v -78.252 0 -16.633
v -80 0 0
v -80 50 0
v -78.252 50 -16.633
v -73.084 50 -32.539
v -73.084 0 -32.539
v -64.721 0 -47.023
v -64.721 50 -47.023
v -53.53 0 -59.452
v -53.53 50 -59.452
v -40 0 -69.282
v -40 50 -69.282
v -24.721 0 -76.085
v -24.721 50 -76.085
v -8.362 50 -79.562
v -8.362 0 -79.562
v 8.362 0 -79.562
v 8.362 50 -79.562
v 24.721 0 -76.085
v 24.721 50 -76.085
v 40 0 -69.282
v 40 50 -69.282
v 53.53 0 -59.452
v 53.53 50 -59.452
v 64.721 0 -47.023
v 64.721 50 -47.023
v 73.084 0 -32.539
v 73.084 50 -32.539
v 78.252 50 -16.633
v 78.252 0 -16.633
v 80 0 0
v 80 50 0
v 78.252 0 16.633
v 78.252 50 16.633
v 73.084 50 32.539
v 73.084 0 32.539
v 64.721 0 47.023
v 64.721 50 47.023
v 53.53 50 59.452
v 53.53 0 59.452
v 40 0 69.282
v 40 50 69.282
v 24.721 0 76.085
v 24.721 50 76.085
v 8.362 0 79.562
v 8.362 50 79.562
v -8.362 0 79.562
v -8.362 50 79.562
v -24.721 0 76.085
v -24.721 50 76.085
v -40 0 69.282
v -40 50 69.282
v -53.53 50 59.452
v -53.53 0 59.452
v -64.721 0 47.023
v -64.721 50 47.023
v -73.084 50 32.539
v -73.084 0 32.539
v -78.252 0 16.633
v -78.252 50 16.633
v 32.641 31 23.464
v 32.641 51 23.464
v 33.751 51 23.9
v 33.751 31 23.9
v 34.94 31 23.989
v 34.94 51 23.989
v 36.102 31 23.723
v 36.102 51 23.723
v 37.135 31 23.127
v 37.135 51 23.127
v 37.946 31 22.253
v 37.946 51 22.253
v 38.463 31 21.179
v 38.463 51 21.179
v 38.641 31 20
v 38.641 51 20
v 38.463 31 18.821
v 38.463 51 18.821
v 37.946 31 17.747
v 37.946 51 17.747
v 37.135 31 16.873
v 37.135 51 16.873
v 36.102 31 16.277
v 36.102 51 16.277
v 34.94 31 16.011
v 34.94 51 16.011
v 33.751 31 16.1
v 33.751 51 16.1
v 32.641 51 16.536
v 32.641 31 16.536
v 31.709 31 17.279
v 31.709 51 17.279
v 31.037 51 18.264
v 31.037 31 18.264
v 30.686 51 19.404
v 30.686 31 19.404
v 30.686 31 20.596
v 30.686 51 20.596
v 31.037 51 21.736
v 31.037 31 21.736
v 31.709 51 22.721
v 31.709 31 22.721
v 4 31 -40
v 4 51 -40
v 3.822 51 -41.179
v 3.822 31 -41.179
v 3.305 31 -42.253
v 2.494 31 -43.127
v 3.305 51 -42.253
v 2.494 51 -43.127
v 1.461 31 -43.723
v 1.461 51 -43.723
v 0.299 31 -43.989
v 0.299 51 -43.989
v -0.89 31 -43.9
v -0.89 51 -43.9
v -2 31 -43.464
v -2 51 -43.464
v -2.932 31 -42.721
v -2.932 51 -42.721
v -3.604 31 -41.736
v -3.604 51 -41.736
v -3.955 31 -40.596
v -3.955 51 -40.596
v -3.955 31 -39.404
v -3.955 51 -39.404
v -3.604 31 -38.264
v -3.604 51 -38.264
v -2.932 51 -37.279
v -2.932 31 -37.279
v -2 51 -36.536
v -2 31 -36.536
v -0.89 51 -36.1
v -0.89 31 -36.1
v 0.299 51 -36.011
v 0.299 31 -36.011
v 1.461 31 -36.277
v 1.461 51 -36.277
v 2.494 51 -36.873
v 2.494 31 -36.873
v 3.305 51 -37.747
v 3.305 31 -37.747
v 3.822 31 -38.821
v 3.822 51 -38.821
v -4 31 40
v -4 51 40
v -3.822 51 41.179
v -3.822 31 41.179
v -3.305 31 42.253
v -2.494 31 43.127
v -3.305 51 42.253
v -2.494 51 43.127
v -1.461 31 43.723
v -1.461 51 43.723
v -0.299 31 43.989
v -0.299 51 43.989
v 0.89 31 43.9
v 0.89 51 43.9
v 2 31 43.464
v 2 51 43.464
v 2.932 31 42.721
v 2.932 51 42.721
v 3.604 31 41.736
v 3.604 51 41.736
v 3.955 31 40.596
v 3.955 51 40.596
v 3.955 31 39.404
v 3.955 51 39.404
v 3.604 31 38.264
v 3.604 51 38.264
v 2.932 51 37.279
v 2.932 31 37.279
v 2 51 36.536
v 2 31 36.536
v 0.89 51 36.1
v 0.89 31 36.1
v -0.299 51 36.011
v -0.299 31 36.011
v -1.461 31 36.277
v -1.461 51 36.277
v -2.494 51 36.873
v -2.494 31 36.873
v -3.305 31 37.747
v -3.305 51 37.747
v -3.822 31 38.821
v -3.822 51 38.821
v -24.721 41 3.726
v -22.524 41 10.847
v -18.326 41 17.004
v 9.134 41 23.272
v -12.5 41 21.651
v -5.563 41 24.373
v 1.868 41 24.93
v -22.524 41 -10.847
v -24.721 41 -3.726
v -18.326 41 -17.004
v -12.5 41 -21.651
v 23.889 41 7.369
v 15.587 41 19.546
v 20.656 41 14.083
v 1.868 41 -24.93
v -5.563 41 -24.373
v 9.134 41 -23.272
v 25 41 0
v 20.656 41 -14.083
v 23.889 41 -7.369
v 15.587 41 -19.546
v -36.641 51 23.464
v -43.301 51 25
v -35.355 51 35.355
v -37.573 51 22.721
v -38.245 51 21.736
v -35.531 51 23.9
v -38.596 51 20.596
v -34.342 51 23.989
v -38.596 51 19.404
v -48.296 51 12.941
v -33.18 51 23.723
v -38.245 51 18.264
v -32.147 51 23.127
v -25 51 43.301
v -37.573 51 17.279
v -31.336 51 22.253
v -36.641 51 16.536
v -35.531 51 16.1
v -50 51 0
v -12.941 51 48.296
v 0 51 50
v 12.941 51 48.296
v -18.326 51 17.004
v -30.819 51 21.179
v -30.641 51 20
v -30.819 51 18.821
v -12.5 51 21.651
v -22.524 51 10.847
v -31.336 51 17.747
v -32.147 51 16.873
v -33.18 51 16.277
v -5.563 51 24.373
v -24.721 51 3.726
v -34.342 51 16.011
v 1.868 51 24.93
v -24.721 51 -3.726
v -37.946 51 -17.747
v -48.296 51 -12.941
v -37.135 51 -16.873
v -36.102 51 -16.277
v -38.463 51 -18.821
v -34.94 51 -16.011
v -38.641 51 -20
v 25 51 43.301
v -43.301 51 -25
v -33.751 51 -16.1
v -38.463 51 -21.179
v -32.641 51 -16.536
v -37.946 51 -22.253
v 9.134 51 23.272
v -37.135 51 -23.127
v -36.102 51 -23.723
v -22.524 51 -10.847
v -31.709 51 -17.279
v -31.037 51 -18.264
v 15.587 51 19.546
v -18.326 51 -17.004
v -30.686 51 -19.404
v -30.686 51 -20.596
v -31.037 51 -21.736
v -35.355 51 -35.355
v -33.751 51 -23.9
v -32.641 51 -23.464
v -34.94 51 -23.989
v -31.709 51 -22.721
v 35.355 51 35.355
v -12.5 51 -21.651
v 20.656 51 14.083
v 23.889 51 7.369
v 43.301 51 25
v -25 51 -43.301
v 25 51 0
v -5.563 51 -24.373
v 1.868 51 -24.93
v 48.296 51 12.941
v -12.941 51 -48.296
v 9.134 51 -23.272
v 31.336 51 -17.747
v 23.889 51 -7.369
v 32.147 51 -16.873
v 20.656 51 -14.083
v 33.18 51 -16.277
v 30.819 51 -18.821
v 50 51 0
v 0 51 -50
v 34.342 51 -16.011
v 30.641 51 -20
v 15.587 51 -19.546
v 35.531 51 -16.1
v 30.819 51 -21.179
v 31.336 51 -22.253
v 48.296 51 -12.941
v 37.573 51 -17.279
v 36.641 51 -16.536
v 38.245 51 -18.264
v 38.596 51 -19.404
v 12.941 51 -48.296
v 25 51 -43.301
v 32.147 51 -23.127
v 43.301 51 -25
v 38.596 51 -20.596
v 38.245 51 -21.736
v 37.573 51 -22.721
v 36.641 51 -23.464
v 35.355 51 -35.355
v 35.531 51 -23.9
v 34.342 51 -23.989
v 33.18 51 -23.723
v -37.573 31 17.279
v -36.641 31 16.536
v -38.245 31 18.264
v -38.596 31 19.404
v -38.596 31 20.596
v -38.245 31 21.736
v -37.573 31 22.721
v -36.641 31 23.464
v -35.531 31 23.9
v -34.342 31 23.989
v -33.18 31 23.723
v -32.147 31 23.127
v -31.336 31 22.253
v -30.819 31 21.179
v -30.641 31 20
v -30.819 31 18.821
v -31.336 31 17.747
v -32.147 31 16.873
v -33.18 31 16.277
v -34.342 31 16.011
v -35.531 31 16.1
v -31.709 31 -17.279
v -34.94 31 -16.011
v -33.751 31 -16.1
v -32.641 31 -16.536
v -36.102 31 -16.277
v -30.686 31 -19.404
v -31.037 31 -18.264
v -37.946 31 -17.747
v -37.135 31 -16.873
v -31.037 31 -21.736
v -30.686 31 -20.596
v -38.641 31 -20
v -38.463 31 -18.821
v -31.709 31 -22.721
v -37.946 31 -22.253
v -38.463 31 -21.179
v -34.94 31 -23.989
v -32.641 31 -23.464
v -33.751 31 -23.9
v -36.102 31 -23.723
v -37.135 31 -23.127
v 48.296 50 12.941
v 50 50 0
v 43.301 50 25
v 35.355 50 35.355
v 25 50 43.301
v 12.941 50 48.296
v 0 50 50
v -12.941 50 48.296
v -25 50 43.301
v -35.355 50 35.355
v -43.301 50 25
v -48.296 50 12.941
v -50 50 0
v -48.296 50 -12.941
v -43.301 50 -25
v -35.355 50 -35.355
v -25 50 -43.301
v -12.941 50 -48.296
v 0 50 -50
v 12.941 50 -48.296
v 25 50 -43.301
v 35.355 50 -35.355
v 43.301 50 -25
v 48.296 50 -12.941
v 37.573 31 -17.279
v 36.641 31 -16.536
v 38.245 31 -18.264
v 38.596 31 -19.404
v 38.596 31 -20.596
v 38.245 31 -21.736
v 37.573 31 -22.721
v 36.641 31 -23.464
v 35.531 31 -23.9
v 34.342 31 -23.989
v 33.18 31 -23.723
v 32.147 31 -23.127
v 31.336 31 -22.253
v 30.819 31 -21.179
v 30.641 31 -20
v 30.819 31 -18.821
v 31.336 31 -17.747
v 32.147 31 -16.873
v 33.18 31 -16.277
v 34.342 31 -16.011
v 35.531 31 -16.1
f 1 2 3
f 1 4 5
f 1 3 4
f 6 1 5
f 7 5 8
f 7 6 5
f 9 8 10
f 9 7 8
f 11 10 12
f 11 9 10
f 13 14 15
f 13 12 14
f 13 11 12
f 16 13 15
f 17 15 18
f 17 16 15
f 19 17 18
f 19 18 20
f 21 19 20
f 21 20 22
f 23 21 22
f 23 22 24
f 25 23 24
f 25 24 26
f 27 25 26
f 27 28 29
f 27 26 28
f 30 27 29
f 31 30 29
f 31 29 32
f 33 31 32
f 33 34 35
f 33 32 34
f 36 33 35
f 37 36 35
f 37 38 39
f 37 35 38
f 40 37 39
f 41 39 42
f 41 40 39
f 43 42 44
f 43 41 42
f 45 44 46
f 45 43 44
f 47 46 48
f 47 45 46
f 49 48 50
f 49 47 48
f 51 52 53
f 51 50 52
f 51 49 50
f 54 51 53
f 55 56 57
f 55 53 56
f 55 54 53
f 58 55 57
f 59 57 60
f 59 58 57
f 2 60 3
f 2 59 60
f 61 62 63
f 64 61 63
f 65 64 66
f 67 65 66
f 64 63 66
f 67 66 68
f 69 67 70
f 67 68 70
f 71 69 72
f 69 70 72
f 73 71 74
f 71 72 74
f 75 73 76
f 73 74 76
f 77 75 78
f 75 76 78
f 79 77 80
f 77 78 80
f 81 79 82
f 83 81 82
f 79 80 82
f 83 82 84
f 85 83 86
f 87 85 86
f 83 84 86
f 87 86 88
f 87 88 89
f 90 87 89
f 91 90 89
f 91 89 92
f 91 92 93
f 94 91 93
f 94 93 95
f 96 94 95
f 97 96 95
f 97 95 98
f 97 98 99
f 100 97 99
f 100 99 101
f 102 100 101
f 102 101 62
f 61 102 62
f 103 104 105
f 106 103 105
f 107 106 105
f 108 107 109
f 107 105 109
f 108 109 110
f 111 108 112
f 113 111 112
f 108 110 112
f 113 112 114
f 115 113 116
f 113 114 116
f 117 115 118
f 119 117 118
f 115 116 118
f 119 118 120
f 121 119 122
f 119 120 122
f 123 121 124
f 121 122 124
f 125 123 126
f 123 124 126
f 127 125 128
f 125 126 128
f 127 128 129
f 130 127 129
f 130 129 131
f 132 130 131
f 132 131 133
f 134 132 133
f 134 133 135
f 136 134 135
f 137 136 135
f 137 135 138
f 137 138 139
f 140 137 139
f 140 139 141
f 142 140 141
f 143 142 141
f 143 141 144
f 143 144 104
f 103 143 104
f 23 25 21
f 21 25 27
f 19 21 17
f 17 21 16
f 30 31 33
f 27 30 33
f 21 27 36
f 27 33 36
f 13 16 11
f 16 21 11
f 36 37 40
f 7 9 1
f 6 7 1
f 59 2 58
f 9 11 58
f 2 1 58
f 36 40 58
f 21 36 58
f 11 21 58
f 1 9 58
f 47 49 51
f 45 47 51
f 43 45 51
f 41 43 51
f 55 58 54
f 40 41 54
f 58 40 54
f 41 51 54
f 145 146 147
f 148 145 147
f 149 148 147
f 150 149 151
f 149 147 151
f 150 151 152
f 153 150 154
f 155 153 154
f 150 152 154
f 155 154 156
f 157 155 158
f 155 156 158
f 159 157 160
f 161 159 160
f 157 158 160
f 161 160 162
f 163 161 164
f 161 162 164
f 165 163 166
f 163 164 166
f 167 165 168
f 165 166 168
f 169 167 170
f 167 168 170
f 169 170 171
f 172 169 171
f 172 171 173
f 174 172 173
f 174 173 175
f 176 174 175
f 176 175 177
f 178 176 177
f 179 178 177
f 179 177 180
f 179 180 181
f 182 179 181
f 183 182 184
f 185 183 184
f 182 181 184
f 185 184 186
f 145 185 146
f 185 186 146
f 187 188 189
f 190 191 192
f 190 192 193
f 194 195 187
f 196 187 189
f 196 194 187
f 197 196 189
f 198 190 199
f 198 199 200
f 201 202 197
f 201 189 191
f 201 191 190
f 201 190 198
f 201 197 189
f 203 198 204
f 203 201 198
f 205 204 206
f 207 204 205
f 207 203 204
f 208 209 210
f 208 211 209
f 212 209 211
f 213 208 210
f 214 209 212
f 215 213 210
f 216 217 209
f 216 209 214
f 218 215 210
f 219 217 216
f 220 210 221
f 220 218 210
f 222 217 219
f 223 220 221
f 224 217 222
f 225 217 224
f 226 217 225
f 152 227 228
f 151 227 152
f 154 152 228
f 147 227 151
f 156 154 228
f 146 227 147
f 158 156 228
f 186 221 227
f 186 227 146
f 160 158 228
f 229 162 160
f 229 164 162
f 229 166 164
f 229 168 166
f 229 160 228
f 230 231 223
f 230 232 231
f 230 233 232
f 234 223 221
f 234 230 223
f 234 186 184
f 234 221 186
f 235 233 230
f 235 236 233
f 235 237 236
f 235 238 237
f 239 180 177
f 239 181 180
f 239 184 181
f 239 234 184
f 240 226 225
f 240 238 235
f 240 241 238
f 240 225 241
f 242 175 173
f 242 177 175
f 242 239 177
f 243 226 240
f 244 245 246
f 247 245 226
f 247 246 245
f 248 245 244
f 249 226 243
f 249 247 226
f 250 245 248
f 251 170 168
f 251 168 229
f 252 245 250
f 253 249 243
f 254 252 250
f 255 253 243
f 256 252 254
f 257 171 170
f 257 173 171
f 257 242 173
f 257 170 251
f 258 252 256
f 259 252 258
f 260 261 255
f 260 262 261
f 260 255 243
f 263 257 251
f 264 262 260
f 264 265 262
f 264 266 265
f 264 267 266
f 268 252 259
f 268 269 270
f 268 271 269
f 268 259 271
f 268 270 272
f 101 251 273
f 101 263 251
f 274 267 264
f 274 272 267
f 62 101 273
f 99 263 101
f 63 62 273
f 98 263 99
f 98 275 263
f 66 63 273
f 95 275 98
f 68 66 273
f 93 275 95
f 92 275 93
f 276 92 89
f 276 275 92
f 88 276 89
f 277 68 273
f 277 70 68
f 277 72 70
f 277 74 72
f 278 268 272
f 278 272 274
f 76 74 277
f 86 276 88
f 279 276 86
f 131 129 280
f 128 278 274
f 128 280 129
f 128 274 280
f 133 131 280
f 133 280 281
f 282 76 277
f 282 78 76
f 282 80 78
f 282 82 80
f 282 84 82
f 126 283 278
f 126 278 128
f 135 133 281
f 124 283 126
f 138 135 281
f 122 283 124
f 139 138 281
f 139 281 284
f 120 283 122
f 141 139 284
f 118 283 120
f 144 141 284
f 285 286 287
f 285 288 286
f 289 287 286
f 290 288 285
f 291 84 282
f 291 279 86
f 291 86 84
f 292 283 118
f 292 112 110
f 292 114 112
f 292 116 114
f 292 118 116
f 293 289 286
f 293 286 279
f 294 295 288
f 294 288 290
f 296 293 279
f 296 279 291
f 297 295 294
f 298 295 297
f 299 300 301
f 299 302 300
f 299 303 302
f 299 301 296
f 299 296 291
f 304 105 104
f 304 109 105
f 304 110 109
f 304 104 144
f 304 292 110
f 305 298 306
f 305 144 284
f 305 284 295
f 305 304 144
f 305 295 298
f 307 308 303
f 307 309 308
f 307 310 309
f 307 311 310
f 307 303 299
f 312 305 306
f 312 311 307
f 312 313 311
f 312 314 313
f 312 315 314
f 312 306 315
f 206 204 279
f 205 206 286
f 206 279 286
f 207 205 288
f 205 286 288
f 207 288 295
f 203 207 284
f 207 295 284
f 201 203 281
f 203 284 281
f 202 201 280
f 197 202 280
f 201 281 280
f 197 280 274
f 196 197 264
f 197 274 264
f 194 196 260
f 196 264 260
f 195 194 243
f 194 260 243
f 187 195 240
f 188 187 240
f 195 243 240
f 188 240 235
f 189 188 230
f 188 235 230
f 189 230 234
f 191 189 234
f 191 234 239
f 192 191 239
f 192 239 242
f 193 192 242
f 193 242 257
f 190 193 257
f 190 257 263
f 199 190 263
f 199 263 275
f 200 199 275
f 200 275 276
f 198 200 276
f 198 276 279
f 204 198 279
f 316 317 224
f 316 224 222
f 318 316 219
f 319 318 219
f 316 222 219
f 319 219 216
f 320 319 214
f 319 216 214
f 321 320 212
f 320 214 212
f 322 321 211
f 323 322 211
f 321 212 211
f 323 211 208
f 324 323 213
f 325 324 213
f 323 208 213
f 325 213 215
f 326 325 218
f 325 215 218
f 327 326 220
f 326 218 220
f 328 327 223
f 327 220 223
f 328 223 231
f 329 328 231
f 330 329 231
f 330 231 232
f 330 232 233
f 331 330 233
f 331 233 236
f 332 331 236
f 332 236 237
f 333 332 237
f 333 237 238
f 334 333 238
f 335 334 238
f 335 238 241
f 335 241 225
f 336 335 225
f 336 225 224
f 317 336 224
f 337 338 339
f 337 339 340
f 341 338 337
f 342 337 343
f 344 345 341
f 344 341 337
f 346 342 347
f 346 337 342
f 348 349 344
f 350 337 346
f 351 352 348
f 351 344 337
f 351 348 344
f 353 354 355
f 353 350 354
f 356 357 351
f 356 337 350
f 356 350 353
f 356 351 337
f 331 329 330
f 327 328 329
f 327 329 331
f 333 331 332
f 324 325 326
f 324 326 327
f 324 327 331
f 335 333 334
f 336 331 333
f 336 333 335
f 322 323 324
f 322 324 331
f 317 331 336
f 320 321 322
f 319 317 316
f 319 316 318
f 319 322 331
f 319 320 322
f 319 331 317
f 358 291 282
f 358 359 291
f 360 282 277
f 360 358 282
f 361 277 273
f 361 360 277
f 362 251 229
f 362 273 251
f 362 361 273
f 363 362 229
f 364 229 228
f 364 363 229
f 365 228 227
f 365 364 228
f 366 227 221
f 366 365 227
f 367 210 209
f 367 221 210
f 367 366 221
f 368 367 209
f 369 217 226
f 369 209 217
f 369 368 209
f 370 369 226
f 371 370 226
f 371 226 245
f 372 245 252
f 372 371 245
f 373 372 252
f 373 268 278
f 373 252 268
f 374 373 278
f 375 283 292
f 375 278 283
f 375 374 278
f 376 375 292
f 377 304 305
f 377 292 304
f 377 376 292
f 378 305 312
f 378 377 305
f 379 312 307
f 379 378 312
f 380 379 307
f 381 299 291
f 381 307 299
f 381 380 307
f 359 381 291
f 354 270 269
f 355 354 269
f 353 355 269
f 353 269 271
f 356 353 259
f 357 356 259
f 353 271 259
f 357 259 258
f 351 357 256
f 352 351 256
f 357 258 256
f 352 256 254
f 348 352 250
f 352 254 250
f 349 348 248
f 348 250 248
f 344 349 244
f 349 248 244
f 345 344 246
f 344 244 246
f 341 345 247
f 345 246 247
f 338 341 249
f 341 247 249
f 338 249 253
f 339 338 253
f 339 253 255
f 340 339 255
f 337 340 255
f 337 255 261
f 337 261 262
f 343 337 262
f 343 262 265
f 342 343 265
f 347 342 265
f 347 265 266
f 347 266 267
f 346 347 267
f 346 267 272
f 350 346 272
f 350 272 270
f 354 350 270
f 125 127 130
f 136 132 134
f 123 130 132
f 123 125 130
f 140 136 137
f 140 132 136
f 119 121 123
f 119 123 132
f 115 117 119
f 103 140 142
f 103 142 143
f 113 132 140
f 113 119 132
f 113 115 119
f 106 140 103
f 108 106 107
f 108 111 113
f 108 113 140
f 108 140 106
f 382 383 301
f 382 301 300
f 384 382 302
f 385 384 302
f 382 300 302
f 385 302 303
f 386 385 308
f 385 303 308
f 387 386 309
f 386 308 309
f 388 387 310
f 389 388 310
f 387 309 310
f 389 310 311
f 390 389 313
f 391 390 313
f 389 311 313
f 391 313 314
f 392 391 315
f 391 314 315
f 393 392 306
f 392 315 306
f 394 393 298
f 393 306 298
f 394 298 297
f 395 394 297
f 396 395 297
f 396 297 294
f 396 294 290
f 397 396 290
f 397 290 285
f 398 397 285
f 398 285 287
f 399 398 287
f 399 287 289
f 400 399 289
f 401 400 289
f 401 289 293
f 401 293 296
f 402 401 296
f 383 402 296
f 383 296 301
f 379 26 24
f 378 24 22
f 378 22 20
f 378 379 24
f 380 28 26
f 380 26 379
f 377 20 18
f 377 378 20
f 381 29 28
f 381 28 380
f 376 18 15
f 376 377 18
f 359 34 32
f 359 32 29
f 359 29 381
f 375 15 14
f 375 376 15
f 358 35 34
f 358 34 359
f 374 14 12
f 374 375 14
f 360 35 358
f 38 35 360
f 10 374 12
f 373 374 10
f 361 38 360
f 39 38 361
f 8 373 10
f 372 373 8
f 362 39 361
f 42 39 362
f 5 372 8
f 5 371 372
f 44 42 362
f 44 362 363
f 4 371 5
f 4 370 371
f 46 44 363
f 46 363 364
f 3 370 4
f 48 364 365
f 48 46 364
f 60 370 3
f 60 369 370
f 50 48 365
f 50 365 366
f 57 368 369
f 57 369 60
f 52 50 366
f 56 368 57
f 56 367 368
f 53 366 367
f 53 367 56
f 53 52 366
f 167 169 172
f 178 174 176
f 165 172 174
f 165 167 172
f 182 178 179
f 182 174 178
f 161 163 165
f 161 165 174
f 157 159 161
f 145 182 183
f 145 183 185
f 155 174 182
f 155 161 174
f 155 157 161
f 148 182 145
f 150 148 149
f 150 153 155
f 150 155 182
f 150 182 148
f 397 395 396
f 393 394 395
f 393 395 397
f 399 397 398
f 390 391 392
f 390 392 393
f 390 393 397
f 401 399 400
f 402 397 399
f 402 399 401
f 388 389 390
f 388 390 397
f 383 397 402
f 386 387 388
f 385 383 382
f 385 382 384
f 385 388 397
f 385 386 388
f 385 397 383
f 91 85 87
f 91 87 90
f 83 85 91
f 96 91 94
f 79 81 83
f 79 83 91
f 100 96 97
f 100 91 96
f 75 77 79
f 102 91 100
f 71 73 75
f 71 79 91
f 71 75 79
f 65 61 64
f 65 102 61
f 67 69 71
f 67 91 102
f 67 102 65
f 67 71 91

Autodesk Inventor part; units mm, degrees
ref_plane "XZ Plane" through (0, 0, 0) normal (0, 1, 0) x (-1, 0, 0)
ref_plane "XY Plane" through (0, 0, 0) normal (0, 0, 1) x (1, 0, 0)
sketch "Sketch1" plane through (0, 0, 0) normal (0, 1, 0) x (-1, 0, 0)
  circle A0 centre (0, 0) radius 80
  dimension "d0" = 160
extrude "Extrusion1" add sketch "Sketch1" along normal blind 50
sketch "Sketch2" plane through (0, 50, 0) normal (0, 1, 0) x (1, 0, 0)
  circle A0 centre (0, 0) radius 50
  dimension "d3" = 100
extrude "Extrusion2" add sketch "Sketch2" along normal blind 1
sketch "Sketch3" plane through (0, 51, 0) normal (0, 1, 0) x (1, 0, 0)
  circle A0 centre (0, 0) radius 25
  dimension "d6" = 50
extrude "Extrusion3" cut sketch "Sketch3" against normal blind 10
sketch "Sketch4" plane through (0, 51, 0) normal (0, 1, 0) x (1, 0, 0)
  circle A0 centre (0, 40) radius 4
  point P0 (0, 0)
  dimension "d9" = 8
  dimension "d10" = 40
extrude "Extrusion4" cut sketch "Sketch4" against normal blind 20
pattern_circular "Circular Pattern1" count 6 over 360 about axis through (0, 51, 0) along (0, -1, 0) of "Extrusion4"
properties part number "JR3_sensor"
